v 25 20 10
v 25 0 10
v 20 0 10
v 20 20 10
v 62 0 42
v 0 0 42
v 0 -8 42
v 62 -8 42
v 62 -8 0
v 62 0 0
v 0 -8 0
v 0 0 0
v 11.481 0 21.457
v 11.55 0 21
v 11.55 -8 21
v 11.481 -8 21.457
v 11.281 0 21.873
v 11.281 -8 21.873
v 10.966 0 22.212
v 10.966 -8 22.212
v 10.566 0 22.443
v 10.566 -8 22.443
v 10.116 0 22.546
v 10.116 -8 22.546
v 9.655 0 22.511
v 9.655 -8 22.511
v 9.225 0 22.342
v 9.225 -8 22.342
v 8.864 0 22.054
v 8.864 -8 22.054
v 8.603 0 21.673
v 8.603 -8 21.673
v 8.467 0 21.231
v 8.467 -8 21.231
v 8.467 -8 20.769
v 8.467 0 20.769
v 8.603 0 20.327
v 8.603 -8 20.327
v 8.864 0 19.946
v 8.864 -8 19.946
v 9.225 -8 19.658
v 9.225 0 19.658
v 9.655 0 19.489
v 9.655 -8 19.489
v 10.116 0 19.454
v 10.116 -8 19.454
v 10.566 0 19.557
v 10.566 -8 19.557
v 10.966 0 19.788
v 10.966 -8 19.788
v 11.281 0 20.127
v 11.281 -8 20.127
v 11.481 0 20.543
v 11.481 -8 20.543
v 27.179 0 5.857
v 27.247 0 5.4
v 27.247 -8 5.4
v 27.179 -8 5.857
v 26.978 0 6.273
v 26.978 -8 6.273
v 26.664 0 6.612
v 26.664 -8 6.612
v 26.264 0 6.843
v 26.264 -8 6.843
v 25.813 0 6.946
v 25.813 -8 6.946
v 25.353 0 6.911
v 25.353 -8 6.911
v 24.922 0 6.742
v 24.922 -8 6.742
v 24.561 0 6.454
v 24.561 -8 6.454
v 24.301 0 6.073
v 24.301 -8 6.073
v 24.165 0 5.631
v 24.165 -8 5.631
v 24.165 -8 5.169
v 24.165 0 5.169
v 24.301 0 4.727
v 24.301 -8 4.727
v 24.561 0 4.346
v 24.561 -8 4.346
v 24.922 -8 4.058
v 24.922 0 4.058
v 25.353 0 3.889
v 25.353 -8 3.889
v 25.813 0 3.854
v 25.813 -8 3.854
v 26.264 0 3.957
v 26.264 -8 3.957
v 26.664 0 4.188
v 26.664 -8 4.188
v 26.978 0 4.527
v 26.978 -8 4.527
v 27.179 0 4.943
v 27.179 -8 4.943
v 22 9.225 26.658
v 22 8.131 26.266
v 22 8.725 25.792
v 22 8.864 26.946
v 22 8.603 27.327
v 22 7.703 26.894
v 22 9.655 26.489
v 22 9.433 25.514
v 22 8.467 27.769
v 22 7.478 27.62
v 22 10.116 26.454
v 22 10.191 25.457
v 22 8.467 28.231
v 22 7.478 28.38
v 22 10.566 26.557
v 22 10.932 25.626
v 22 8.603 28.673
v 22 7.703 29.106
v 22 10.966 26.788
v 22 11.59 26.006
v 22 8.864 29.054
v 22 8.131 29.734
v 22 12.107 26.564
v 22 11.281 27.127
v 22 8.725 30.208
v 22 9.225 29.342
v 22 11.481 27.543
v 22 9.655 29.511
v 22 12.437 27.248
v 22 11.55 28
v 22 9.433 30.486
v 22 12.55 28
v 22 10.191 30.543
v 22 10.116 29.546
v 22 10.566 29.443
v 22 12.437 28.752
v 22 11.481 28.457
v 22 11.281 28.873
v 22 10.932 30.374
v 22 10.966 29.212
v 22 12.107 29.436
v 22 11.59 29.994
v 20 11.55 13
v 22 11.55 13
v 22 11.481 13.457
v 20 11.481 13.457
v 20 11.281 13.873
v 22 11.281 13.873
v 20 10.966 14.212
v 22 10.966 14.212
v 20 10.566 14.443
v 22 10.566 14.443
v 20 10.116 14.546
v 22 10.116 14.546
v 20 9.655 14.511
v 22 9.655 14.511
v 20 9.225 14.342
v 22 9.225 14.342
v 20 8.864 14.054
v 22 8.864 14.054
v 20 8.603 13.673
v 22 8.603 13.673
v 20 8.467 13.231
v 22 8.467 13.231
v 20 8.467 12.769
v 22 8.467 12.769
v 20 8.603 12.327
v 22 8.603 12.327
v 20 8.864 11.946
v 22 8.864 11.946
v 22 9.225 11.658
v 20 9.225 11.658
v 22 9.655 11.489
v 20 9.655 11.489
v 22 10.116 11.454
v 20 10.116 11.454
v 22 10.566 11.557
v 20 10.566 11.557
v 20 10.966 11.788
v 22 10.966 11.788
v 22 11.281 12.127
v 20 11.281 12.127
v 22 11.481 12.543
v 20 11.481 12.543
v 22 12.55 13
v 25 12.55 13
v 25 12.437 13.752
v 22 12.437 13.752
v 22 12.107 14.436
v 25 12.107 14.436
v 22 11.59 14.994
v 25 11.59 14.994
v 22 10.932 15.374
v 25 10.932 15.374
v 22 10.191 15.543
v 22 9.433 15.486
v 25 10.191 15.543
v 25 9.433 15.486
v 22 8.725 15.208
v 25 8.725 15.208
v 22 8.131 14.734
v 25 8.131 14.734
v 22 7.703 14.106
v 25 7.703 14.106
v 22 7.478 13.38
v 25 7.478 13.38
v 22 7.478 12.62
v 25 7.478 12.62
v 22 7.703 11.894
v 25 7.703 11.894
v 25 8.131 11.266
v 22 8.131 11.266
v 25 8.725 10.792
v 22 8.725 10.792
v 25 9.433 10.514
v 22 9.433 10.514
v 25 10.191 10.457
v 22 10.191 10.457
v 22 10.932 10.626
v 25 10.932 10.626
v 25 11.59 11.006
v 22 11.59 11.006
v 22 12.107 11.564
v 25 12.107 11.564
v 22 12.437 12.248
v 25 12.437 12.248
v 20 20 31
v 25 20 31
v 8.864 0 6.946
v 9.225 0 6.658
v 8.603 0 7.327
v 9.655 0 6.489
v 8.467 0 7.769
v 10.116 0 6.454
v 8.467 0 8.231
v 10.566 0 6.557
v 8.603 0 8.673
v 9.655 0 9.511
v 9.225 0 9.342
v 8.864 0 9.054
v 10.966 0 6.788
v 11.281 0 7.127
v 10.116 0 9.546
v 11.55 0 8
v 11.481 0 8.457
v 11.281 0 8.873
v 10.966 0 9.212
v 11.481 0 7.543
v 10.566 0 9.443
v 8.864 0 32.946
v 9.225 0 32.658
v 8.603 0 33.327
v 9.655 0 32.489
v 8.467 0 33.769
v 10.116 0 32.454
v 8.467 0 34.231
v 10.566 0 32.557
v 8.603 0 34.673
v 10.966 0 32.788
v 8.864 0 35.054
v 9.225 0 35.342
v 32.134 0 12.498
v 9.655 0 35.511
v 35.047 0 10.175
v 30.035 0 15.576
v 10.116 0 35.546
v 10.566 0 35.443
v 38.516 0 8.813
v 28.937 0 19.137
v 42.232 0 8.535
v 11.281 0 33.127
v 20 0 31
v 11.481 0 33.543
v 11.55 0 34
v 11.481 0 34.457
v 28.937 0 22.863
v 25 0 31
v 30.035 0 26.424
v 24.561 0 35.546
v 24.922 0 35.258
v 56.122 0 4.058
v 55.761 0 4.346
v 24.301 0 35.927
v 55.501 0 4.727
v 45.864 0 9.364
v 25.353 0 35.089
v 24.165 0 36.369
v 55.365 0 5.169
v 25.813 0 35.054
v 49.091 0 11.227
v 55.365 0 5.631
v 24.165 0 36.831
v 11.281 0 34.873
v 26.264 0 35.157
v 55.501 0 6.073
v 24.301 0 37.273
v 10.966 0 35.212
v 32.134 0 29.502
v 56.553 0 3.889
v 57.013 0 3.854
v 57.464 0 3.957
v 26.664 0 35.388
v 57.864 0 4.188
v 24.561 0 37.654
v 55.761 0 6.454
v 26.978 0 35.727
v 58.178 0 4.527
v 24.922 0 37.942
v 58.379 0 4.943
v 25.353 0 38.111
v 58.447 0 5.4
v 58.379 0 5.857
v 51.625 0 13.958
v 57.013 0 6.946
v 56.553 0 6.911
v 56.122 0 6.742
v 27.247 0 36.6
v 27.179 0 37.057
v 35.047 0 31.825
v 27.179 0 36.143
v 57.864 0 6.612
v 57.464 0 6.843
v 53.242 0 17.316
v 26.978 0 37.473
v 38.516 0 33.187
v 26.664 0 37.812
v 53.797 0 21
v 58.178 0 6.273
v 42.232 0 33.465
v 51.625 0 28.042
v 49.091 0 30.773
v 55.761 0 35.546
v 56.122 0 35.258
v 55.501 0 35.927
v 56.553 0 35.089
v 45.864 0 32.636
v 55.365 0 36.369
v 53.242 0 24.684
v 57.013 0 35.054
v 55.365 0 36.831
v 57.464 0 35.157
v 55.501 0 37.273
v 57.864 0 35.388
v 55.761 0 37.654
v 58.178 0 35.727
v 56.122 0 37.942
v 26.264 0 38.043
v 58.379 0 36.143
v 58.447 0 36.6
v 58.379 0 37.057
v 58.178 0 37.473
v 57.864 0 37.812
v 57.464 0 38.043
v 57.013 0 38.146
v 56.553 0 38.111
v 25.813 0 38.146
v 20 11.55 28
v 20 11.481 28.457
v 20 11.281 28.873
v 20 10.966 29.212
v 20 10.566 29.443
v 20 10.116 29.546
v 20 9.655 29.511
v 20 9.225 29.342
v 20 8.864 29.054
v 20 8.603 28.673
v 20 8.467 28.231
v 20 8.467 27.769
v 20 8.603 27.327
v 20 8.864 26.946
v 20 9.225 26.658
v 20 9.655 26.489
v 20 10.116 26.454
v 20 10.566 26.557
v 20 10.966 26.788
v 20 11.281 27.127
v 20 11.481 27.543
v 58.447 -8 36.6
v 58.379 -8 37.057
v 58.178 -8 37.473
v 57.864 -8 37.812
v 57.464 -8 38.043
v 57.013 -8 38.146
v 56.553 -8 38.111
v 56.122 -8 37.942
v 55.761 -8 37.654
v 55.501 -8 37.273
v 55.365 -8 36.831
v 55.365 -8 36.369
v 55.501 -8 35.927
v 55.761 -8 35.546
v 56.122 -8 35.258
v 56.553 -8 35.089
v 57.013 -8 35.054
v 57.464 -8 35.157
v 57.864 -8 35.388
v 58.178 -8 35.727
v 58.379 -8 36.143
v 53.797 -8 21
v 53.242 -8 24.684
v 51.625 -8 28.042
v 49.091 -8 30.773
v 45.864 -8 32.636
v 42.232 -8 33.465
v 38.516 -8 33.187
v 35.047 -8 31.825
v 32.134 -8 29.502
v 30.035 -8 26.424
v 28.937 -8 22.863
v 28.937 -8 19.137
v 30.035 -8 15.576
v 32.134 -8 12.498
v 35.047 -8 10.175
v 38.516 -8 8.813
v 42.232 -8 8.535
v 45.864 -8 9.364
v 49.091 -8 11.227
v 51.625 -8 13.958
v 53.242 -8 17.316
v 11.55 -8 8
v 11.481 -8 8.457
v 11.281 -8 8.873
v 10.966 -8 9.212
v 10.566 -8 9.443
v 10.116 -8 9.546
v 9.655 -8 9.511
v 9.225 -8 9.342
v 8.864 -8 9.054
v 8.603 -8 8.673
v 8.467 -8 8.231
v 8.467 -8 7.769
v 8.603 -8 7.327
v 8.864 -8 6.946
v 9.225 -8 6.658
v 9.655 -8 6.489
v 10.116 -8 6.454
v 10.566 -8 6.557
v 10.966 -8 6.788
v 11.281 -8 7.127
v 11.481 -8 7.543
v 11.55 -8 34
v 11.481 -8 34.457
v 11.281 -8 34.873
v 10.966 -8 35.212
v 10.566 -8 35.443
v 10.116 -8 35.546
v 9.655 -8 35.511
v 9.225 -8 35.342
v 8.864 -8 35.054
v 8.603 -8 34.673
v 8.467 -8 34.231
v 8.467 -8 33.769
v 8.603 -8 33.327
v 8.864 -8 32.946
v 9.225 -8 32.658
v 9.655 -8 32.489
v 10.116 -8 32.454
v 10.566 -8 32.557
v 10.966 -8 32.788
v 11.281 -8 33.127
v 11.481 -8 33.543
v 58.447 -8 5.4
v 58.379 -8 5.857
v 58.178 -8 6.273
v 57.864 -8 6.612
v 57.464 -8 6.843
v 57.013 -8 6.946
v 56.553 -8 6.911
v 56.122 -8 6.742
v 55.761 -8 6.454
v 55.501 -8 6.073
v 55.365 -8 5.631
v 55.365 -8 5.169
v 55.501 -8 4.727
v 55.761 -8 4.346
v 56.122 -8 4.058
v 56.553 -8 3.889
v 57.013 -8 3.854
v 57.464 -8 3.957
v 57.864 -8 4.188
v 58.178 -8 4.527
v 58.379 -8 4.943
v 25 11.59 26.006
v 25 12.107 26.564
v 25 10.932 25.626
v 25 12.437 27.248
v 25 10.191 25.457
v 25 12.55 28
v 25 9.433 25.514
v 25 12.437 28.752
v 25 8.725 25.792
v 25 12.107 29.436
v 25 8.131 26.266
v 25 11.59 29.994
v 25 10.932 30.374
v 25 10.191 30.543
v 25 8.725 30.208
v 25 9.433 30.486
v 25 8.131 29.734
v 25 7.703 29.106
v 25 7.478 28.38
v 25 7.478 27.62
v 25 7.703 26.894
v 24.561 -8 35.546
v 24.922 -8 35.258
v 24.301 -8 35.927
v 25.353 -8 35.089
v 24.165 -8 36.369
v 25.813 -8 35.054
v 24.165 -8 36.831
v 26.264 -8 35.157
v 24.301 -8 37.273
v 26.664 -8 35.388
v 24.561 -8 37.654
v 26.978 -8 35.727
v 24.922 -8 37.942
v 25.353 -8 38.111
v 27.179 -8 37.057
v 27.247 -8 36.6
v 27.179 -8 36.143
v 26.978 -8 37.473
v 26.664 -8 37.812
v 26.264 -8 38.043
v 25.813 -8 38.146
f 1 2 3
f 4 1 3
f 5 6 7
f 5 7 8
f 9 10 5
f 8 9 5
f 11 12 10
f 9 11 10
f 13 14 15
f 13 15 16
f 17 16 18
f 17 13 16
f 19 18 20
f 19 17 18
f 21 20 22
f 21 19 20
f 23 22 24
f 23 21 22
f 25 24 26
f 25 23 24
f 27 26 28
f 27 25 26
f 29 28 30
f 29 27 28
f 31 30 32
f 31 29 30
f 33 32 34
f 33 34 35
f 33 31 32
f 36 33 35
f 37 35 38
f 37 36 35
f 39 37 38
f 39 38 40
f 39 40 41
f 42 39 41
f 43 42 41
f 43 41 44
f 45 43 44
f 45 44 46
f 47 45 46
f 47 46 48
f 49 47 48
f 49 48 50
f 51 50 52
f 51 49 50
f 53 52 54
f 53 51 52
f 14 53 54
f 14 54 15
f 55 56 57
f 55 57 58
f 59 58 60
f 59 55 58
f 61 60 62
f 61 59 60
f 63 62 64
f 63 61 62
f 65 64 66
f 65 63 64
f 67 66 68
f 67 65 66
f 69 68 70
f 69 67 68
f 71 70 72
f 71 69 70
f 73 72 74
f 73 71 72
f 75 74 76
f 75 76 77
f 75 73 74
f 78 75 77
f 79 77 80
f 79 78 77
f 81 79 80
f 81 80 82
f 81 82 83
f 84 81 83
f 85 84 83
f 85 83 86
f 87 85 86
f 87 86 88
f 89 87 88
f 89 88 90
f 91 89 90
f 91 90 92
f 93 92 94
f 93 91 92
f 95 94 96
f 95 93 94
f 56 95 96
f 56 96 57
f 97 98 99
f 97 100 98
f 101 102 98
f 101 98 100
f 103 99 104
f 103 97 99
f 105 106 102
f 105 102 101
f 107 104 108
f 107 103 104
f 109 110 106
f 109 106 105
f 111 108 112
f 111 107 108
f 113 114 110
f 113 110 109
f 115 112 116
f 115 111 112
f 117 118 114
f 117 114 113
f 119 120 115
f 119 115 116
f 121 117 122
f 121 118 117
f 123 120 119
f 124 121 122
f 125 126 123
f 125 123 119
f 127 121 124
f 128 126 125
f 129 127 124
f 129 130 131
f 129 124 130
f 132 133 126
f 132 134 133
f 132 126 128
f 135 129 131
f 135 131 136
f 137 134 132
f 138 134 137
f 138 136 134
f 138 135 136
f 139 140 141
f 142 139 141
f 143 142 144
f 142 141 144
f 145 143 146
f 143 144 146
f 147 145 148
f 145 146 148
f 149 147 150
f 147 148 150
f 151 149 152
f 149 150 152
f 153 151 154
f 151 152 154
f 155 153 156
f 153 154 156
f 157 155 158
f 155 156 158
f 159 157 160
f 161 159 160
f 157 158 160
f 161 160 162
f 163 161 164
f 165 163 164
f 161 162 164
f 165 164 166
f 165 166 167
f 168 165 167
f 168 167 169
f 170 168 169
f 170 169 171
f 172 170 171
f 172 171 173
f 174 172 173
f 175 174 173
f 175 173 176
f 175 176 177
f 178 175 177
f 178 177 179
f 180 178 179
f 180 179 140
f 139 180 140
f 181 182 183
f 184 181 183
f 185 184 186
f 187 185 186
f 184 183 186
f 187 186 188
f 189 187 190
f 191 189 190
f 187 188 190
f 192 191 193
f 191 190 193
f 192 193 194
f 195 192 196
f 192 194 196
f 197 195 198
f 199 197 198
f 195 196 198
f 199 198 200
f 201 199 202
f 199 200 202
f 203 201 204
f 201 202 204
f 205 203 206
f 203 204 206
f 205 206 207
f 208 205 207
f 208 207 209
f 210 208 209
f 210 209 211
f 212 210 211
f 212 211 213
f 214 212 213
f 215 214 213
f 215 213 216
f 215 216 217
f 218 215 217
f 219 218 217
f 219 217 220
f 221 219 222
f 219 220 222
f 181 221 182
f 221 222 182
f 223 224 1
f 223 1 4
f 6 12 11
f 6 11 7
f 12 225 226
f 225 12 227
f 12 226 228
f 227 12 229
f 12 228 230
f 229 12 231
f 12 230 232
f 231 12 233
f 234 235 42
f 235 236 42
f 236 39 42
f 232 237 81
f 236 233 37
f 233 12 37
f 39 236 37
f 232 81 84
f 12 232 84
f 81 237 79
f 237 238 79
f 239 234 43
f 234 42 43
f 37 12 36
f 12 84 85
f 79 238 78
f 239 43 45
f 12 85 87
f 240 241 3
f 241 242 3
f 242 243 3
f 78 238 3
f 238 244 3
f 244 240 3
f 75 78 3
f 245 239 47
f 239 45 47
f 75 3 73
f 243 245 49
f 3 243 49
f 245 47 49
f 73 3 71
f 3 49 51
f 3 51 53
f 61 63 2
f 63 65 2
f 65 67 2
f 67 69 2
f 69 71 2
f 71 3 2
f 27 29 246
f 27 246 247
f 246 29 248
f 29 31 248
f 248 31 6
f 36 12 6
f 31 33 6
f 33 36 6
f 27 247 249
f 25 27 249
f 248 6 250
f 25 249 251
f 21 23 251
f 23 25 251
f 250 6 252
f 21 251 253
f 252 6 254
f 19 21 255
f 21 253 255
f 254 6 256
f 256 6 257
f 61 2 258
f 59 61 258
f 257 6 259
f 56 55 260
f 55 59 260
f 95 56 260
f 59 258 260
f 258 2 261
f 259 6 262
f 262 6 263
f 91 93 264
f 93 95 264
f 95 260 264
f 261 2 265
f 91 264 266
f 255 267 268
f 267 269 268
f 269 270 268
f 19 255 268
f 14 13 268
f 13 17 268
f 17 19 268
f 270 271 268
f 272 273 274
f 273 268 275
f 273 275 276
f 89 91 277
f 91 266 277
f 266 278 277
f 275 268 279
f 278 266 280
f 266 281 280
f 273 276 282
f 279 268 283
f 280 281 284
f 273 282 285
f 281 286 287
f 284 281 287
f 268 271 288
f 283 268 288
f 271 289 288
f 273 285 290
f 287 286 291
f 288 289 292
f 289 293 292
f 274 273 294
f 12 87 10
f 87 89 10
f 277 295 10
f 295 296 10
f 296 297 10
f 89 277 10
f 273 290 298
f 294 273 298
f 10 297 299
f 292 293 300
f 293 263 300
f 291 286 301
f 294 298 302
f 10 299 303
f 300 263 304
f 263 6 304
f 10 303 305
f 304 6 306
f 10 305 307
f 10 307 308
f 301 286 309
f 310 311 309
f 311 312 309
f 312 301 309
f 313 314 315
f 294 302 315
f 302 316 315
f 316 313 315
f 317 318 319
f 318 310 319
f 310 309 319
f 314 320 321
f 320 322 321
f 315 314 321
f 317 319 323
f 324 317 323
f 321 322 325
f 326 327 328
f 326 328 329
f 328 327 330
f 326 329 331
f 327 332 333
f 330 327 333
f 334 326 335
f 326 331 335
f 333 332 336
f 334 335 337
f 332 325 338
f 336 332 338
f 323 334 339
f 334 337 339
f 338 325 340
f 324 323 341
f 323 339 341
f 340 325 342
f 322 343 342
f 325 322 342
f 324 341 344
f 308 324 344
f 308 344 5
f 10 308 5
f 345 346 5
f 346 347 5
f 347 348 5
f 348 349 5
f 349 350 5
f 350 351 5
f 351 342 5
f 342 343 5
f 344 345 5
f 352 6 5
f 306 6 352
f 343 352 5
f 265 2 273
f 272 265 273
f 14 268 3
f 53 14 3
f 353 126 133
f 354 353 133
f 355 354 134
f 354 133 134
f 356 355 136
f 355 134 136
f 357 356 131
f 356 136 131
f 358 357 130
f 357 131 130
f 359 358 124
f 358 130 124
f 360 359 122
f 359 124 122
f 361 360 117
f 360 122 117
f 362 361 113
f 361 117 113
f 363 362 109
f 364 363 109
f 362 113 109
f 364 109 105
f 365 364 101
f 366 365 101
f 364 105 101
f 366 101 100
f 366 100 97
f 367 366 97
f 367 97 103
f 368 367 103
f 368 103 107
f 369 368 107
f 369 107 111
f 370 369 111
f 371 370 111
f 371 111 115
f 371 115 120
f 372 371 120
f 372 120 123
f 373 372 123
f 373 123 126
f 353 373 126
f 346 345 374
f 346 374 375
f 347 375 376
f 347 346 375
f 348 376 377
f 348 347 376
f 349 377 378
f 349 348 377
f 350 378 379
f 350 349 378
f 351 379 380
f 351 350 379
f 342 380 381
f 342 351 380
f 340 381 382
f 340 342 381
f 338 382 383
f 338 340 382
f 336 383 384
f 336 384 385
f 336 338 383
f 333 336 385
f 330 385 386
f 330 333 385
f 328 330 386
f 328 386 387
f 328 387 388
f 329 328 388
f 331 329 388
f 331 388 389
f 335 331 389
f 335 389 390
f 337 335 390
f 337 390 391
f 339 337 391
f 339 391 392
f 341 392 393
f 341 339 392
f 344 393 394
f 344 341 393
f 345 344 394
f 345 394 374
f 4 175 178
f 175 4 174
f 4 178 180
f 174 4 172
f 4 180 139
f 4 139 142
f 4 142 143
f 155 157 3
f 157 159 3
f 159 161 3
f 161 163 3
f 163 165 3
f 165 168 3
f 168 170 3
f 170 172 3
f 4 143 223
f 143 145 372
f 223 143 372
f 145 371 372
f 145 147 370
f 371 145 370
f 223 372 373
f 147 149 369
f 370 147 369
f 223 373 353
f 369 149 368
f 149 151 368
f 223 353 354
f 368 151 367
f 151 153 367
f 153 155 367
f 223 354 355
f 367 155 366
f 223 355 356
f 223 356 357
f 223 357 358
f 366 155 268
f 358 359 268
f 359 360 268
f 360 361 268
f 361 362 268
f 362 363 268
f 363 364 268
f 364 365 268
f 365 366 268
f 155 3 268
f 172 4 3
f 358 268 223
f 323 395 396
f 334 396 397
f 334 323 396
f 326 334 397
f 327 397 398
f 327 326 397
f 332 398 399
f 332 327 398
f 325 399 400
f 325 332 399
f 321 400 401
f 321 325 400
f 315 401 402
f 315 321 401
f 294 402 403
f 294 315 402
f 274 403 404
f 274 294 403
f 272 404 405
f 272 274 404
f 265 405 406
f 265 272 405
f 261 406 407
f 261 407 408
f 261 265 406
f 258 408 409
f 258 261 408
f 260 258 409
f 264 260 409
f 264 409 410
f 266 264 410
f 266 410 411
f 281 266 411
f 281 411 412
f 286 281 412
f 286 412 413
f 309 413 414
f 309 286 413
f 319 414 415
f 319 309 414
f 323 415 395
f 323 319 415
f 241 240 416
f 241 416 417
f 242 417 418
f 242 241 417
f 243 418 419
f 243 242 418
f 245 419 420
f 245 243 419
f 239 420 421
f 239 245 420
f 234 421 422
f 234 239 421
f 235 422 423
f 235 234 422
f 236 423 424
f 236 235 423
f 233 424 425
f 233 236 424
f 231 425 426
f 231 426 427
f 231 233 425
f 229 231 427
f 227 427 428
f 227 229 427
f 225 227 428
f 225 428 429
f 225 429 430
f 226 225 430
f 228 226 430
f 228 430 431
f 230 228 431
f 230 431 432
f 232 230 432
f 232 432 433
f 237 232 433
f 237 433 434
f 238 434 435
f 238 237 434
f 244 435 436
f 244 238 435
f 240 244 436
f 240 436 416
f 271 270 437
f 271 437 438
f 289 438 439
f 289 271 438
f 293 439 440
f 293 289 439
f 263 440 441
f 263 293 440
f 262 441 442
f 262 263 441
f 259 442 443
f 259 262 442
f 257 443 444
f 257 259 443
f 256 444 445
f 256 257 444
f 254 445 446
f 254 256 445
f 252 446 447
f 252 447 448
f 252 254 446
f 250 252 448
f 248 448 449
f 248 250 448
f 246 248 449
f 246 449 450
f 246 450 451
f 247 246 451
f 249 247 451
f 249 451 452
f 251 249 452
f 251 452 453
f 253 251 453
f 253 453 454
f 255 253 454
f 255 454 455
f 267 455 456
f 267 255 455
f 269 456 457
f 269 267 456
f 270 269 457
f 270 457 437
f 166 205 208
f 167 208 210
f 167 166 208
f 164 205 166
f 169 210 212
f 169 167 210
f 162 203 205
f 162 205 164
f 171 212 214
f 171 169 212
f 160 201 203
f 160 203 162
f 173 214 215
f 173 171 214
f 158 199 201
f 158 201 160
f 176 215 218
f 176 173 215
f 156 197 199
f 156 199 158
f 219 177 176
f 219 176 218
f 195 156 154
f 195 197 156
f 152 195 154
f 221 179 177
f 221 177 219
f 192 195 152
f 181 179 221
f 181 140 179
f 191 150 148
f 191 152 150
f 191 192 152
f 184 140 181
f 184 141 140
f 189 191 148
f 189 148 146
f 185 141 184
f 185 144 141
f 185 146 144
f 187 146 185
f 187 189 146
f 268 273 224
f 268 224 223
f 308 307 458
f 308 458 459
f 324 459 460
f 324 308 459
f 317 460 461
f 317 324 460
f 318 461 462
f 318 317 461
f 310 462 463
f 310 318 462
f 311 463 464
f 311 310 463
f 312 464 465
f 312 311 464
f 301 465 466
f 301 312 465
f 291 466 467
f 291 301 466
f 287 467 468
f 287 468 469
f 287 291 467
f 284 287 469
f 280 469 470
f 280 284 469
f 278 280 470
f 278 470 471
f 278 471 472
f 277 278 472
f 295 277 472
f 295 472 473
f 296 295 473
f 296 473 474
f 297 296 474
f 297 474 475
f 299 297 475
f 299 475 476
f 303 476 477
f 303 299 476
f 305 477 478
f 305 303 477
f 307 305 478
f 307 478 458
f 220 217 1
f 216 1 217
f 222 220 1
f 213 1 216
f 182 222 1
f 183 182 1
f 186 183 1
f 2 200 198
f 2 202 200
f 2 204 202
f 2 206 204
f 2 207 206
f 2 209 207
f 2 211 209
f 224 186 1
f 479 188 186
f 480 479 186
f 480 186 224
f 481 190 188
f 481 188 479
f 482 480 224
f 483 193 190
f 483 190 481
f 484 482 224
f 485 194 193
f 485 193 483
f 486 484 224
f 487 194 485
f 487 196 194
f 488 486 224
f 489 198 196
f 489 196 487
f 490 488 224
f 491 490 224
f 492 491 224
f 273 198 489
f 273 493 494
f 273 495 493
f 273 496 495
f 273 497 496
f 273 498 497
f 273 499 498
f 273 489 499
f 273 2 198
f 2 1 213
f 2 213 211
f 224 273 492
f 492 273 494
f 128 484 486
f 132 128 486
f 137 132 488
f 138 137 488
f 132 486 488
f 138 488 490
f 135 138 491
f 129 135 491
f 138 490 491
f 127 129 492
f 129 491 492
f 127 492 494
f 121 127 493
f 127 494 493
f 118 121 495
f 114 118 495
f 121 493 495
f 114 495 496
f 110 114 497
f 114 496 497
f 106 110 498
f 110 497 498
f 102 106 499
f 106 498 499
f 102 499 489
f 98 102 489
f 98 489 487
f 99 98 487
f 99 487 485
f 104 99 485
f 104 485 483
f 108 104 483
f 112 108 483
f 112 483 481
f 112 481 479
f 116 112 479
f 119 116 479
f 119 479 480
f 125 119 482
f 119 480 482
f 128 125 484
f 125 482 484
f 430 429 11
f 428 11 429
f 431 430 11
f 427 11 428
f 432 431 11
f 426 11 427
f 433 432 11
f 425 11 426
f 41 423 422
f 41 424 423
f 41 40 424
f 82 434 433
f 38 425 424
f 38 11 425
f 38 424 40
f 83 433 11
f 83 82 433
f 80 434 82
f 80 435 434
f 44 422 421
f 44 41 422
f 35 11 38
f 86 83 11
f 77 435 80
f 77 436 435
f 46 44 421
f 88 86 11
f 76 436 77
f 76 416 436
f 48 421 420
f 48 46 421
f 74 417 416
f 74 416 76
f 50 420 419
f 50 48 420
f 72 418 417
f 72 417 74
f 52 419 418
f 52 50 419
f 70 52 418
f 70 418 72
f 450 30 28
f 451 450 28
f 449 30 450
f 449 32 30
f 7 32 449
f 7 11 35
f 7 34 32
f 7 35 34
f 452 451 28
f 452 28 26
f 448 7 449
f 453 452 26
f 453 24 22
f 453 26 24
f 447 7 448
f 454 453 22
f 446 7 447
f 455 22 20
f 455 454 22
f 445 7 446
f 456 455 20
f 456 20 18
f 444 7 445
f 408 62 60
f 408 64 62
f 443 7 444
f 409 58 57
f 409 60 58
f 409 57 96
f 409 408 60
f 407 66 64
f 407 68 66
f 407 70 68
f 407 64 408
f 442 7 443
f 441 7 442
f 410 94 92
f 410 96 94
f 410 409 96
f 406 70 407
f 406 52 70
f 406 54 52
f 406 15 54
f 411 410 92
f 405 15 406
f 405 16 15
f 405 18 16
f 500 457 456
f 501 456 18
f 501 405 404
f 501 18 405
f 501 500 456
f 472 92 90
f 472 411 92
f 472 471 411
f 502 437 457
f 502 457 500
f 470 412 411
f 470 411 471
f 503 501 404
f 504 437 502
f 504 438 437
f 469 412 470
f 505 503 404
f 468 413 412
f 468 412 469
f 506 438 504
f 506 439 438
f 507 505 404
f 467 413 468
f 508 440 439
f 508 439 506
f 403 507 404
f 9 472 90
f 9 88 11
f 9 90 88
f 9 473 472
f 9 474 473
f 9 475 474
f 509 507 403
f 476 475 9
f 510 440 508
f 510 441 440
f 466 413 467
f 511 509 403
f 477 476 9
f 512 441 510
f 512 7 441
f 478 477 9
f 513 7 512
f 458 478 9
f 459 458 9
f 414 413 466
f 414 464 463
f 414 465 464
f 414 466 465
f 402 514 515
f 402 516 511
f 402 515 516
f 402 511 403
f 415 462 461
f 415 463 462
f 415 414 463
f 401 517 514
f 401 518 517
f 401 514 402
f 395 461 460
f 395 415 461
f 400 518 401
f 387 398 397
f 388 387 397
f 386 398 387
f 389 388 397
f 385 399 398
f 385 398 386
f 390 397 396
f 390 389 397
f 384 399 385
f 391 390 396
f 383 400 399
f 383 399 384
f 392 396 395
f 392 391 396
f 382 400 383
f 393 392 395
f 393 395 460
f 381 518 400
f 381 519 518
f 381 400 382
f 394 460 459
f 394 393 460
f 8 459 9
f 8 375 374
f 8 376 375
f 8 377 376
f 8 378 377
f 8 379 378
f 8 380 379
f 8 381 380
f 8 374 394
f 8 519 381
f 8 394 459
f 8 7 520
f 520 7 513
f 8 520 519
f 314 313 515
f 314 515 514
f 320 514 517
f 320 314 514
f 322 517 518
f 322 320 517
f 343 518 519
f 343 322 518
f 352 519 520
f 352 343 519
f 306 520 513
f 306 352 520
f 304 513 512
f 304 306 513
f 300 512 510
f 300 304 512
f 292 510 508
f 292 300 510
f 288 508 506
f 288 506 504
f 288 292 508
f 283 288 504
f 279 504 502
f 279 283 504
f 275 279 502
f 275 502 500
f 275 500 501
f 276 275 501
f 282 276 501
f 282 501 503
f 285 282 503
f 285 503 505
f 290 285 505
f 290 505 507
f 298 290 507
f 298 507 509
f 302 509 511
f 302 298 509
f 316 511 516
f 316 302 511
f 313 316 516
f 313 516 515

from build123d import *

# Parameters (mm, degrees)
F0_W     = 62
F0_H     = 42
F0_R     = 1.55
F0_R_2   = 12.5
F1_DEPTH = 8
F2_W     = 5
F2_H     = 21
F3_DEPTH = 20
F4_R     = 1.55
F5_DEPTH = 25
F6_R     = 2.55
F7_DEPTH = 3


with BuildPart() as f1:
    # F0 (on Front) → F1 (new body)
    with BuildSketch(Plane.XZ):
        with Locations((31, 21)):
            Rectangle(F0_W, F0_H)
        with Locations((10, 8)):
            Circle(F0_R, mode=Mode.SUBTRACT)
        with Locations((25.697473, 5.4)):
            Circle(F0_R, mode=Mode.SUBTRACT)
        with Locations((56.897473, 5.4)):
            Circle(F0_R, mode=Mode.SUBTRACT)
        with Locations((10, 21)):
            Circle(F0_R, mode=Mode.SUBTRACT)
        with Locations((10, 34)):
            Circle(F0_R, mode=Mode.SUBTRACT)
        with Locations((25.697473, 36.6)):
            Circle(F0_R, mode=Mode.SUBTRACT)
        with Locations((41.297473, 21)):
            Circle(F0_R_2, mode=Mode.SUBTRACT)
        with Locations((56.897473, 36.6)):
            Circle(F0_R, mode=Mode.SUBTRACT)
    extrude(amount=F1_DEPTH)

    # F2 (on face) → F3 (join)
    with BuildSketch(Plane(origin=(0, 0, 0), x_dir=(-1, 0, 0), z_dir=(0, 1, 0))):
        with Locations((-22.5, 20.5)):
            Rectangle(F2_W, F2_H)
    extrude(amount=F3_DEPTH)

    # F4 (on face) → F5 (cut)
    with BuildSketch(Plane.YZ.offset(25)):
        with Locations((10, 28)):
            Circle(F4_R)
        with Locations((10, 13)):
            Circle(F4_R)
    extrude(amount=-F5_DEPTH, mode=Mode.SUBTRACT)

    # F6 (on face) → F7 (cut)
    with BuildSketch(Plane.YZ.offset(25)):
        with Locations((10, 28)):
            Circle(F6_R)
        with Locations((10, 13)):
            Circle(F6_R)
    extrude(amount=-F7_DEPTH, mode=Mode.SUBTRACT)


solid = f1.part
